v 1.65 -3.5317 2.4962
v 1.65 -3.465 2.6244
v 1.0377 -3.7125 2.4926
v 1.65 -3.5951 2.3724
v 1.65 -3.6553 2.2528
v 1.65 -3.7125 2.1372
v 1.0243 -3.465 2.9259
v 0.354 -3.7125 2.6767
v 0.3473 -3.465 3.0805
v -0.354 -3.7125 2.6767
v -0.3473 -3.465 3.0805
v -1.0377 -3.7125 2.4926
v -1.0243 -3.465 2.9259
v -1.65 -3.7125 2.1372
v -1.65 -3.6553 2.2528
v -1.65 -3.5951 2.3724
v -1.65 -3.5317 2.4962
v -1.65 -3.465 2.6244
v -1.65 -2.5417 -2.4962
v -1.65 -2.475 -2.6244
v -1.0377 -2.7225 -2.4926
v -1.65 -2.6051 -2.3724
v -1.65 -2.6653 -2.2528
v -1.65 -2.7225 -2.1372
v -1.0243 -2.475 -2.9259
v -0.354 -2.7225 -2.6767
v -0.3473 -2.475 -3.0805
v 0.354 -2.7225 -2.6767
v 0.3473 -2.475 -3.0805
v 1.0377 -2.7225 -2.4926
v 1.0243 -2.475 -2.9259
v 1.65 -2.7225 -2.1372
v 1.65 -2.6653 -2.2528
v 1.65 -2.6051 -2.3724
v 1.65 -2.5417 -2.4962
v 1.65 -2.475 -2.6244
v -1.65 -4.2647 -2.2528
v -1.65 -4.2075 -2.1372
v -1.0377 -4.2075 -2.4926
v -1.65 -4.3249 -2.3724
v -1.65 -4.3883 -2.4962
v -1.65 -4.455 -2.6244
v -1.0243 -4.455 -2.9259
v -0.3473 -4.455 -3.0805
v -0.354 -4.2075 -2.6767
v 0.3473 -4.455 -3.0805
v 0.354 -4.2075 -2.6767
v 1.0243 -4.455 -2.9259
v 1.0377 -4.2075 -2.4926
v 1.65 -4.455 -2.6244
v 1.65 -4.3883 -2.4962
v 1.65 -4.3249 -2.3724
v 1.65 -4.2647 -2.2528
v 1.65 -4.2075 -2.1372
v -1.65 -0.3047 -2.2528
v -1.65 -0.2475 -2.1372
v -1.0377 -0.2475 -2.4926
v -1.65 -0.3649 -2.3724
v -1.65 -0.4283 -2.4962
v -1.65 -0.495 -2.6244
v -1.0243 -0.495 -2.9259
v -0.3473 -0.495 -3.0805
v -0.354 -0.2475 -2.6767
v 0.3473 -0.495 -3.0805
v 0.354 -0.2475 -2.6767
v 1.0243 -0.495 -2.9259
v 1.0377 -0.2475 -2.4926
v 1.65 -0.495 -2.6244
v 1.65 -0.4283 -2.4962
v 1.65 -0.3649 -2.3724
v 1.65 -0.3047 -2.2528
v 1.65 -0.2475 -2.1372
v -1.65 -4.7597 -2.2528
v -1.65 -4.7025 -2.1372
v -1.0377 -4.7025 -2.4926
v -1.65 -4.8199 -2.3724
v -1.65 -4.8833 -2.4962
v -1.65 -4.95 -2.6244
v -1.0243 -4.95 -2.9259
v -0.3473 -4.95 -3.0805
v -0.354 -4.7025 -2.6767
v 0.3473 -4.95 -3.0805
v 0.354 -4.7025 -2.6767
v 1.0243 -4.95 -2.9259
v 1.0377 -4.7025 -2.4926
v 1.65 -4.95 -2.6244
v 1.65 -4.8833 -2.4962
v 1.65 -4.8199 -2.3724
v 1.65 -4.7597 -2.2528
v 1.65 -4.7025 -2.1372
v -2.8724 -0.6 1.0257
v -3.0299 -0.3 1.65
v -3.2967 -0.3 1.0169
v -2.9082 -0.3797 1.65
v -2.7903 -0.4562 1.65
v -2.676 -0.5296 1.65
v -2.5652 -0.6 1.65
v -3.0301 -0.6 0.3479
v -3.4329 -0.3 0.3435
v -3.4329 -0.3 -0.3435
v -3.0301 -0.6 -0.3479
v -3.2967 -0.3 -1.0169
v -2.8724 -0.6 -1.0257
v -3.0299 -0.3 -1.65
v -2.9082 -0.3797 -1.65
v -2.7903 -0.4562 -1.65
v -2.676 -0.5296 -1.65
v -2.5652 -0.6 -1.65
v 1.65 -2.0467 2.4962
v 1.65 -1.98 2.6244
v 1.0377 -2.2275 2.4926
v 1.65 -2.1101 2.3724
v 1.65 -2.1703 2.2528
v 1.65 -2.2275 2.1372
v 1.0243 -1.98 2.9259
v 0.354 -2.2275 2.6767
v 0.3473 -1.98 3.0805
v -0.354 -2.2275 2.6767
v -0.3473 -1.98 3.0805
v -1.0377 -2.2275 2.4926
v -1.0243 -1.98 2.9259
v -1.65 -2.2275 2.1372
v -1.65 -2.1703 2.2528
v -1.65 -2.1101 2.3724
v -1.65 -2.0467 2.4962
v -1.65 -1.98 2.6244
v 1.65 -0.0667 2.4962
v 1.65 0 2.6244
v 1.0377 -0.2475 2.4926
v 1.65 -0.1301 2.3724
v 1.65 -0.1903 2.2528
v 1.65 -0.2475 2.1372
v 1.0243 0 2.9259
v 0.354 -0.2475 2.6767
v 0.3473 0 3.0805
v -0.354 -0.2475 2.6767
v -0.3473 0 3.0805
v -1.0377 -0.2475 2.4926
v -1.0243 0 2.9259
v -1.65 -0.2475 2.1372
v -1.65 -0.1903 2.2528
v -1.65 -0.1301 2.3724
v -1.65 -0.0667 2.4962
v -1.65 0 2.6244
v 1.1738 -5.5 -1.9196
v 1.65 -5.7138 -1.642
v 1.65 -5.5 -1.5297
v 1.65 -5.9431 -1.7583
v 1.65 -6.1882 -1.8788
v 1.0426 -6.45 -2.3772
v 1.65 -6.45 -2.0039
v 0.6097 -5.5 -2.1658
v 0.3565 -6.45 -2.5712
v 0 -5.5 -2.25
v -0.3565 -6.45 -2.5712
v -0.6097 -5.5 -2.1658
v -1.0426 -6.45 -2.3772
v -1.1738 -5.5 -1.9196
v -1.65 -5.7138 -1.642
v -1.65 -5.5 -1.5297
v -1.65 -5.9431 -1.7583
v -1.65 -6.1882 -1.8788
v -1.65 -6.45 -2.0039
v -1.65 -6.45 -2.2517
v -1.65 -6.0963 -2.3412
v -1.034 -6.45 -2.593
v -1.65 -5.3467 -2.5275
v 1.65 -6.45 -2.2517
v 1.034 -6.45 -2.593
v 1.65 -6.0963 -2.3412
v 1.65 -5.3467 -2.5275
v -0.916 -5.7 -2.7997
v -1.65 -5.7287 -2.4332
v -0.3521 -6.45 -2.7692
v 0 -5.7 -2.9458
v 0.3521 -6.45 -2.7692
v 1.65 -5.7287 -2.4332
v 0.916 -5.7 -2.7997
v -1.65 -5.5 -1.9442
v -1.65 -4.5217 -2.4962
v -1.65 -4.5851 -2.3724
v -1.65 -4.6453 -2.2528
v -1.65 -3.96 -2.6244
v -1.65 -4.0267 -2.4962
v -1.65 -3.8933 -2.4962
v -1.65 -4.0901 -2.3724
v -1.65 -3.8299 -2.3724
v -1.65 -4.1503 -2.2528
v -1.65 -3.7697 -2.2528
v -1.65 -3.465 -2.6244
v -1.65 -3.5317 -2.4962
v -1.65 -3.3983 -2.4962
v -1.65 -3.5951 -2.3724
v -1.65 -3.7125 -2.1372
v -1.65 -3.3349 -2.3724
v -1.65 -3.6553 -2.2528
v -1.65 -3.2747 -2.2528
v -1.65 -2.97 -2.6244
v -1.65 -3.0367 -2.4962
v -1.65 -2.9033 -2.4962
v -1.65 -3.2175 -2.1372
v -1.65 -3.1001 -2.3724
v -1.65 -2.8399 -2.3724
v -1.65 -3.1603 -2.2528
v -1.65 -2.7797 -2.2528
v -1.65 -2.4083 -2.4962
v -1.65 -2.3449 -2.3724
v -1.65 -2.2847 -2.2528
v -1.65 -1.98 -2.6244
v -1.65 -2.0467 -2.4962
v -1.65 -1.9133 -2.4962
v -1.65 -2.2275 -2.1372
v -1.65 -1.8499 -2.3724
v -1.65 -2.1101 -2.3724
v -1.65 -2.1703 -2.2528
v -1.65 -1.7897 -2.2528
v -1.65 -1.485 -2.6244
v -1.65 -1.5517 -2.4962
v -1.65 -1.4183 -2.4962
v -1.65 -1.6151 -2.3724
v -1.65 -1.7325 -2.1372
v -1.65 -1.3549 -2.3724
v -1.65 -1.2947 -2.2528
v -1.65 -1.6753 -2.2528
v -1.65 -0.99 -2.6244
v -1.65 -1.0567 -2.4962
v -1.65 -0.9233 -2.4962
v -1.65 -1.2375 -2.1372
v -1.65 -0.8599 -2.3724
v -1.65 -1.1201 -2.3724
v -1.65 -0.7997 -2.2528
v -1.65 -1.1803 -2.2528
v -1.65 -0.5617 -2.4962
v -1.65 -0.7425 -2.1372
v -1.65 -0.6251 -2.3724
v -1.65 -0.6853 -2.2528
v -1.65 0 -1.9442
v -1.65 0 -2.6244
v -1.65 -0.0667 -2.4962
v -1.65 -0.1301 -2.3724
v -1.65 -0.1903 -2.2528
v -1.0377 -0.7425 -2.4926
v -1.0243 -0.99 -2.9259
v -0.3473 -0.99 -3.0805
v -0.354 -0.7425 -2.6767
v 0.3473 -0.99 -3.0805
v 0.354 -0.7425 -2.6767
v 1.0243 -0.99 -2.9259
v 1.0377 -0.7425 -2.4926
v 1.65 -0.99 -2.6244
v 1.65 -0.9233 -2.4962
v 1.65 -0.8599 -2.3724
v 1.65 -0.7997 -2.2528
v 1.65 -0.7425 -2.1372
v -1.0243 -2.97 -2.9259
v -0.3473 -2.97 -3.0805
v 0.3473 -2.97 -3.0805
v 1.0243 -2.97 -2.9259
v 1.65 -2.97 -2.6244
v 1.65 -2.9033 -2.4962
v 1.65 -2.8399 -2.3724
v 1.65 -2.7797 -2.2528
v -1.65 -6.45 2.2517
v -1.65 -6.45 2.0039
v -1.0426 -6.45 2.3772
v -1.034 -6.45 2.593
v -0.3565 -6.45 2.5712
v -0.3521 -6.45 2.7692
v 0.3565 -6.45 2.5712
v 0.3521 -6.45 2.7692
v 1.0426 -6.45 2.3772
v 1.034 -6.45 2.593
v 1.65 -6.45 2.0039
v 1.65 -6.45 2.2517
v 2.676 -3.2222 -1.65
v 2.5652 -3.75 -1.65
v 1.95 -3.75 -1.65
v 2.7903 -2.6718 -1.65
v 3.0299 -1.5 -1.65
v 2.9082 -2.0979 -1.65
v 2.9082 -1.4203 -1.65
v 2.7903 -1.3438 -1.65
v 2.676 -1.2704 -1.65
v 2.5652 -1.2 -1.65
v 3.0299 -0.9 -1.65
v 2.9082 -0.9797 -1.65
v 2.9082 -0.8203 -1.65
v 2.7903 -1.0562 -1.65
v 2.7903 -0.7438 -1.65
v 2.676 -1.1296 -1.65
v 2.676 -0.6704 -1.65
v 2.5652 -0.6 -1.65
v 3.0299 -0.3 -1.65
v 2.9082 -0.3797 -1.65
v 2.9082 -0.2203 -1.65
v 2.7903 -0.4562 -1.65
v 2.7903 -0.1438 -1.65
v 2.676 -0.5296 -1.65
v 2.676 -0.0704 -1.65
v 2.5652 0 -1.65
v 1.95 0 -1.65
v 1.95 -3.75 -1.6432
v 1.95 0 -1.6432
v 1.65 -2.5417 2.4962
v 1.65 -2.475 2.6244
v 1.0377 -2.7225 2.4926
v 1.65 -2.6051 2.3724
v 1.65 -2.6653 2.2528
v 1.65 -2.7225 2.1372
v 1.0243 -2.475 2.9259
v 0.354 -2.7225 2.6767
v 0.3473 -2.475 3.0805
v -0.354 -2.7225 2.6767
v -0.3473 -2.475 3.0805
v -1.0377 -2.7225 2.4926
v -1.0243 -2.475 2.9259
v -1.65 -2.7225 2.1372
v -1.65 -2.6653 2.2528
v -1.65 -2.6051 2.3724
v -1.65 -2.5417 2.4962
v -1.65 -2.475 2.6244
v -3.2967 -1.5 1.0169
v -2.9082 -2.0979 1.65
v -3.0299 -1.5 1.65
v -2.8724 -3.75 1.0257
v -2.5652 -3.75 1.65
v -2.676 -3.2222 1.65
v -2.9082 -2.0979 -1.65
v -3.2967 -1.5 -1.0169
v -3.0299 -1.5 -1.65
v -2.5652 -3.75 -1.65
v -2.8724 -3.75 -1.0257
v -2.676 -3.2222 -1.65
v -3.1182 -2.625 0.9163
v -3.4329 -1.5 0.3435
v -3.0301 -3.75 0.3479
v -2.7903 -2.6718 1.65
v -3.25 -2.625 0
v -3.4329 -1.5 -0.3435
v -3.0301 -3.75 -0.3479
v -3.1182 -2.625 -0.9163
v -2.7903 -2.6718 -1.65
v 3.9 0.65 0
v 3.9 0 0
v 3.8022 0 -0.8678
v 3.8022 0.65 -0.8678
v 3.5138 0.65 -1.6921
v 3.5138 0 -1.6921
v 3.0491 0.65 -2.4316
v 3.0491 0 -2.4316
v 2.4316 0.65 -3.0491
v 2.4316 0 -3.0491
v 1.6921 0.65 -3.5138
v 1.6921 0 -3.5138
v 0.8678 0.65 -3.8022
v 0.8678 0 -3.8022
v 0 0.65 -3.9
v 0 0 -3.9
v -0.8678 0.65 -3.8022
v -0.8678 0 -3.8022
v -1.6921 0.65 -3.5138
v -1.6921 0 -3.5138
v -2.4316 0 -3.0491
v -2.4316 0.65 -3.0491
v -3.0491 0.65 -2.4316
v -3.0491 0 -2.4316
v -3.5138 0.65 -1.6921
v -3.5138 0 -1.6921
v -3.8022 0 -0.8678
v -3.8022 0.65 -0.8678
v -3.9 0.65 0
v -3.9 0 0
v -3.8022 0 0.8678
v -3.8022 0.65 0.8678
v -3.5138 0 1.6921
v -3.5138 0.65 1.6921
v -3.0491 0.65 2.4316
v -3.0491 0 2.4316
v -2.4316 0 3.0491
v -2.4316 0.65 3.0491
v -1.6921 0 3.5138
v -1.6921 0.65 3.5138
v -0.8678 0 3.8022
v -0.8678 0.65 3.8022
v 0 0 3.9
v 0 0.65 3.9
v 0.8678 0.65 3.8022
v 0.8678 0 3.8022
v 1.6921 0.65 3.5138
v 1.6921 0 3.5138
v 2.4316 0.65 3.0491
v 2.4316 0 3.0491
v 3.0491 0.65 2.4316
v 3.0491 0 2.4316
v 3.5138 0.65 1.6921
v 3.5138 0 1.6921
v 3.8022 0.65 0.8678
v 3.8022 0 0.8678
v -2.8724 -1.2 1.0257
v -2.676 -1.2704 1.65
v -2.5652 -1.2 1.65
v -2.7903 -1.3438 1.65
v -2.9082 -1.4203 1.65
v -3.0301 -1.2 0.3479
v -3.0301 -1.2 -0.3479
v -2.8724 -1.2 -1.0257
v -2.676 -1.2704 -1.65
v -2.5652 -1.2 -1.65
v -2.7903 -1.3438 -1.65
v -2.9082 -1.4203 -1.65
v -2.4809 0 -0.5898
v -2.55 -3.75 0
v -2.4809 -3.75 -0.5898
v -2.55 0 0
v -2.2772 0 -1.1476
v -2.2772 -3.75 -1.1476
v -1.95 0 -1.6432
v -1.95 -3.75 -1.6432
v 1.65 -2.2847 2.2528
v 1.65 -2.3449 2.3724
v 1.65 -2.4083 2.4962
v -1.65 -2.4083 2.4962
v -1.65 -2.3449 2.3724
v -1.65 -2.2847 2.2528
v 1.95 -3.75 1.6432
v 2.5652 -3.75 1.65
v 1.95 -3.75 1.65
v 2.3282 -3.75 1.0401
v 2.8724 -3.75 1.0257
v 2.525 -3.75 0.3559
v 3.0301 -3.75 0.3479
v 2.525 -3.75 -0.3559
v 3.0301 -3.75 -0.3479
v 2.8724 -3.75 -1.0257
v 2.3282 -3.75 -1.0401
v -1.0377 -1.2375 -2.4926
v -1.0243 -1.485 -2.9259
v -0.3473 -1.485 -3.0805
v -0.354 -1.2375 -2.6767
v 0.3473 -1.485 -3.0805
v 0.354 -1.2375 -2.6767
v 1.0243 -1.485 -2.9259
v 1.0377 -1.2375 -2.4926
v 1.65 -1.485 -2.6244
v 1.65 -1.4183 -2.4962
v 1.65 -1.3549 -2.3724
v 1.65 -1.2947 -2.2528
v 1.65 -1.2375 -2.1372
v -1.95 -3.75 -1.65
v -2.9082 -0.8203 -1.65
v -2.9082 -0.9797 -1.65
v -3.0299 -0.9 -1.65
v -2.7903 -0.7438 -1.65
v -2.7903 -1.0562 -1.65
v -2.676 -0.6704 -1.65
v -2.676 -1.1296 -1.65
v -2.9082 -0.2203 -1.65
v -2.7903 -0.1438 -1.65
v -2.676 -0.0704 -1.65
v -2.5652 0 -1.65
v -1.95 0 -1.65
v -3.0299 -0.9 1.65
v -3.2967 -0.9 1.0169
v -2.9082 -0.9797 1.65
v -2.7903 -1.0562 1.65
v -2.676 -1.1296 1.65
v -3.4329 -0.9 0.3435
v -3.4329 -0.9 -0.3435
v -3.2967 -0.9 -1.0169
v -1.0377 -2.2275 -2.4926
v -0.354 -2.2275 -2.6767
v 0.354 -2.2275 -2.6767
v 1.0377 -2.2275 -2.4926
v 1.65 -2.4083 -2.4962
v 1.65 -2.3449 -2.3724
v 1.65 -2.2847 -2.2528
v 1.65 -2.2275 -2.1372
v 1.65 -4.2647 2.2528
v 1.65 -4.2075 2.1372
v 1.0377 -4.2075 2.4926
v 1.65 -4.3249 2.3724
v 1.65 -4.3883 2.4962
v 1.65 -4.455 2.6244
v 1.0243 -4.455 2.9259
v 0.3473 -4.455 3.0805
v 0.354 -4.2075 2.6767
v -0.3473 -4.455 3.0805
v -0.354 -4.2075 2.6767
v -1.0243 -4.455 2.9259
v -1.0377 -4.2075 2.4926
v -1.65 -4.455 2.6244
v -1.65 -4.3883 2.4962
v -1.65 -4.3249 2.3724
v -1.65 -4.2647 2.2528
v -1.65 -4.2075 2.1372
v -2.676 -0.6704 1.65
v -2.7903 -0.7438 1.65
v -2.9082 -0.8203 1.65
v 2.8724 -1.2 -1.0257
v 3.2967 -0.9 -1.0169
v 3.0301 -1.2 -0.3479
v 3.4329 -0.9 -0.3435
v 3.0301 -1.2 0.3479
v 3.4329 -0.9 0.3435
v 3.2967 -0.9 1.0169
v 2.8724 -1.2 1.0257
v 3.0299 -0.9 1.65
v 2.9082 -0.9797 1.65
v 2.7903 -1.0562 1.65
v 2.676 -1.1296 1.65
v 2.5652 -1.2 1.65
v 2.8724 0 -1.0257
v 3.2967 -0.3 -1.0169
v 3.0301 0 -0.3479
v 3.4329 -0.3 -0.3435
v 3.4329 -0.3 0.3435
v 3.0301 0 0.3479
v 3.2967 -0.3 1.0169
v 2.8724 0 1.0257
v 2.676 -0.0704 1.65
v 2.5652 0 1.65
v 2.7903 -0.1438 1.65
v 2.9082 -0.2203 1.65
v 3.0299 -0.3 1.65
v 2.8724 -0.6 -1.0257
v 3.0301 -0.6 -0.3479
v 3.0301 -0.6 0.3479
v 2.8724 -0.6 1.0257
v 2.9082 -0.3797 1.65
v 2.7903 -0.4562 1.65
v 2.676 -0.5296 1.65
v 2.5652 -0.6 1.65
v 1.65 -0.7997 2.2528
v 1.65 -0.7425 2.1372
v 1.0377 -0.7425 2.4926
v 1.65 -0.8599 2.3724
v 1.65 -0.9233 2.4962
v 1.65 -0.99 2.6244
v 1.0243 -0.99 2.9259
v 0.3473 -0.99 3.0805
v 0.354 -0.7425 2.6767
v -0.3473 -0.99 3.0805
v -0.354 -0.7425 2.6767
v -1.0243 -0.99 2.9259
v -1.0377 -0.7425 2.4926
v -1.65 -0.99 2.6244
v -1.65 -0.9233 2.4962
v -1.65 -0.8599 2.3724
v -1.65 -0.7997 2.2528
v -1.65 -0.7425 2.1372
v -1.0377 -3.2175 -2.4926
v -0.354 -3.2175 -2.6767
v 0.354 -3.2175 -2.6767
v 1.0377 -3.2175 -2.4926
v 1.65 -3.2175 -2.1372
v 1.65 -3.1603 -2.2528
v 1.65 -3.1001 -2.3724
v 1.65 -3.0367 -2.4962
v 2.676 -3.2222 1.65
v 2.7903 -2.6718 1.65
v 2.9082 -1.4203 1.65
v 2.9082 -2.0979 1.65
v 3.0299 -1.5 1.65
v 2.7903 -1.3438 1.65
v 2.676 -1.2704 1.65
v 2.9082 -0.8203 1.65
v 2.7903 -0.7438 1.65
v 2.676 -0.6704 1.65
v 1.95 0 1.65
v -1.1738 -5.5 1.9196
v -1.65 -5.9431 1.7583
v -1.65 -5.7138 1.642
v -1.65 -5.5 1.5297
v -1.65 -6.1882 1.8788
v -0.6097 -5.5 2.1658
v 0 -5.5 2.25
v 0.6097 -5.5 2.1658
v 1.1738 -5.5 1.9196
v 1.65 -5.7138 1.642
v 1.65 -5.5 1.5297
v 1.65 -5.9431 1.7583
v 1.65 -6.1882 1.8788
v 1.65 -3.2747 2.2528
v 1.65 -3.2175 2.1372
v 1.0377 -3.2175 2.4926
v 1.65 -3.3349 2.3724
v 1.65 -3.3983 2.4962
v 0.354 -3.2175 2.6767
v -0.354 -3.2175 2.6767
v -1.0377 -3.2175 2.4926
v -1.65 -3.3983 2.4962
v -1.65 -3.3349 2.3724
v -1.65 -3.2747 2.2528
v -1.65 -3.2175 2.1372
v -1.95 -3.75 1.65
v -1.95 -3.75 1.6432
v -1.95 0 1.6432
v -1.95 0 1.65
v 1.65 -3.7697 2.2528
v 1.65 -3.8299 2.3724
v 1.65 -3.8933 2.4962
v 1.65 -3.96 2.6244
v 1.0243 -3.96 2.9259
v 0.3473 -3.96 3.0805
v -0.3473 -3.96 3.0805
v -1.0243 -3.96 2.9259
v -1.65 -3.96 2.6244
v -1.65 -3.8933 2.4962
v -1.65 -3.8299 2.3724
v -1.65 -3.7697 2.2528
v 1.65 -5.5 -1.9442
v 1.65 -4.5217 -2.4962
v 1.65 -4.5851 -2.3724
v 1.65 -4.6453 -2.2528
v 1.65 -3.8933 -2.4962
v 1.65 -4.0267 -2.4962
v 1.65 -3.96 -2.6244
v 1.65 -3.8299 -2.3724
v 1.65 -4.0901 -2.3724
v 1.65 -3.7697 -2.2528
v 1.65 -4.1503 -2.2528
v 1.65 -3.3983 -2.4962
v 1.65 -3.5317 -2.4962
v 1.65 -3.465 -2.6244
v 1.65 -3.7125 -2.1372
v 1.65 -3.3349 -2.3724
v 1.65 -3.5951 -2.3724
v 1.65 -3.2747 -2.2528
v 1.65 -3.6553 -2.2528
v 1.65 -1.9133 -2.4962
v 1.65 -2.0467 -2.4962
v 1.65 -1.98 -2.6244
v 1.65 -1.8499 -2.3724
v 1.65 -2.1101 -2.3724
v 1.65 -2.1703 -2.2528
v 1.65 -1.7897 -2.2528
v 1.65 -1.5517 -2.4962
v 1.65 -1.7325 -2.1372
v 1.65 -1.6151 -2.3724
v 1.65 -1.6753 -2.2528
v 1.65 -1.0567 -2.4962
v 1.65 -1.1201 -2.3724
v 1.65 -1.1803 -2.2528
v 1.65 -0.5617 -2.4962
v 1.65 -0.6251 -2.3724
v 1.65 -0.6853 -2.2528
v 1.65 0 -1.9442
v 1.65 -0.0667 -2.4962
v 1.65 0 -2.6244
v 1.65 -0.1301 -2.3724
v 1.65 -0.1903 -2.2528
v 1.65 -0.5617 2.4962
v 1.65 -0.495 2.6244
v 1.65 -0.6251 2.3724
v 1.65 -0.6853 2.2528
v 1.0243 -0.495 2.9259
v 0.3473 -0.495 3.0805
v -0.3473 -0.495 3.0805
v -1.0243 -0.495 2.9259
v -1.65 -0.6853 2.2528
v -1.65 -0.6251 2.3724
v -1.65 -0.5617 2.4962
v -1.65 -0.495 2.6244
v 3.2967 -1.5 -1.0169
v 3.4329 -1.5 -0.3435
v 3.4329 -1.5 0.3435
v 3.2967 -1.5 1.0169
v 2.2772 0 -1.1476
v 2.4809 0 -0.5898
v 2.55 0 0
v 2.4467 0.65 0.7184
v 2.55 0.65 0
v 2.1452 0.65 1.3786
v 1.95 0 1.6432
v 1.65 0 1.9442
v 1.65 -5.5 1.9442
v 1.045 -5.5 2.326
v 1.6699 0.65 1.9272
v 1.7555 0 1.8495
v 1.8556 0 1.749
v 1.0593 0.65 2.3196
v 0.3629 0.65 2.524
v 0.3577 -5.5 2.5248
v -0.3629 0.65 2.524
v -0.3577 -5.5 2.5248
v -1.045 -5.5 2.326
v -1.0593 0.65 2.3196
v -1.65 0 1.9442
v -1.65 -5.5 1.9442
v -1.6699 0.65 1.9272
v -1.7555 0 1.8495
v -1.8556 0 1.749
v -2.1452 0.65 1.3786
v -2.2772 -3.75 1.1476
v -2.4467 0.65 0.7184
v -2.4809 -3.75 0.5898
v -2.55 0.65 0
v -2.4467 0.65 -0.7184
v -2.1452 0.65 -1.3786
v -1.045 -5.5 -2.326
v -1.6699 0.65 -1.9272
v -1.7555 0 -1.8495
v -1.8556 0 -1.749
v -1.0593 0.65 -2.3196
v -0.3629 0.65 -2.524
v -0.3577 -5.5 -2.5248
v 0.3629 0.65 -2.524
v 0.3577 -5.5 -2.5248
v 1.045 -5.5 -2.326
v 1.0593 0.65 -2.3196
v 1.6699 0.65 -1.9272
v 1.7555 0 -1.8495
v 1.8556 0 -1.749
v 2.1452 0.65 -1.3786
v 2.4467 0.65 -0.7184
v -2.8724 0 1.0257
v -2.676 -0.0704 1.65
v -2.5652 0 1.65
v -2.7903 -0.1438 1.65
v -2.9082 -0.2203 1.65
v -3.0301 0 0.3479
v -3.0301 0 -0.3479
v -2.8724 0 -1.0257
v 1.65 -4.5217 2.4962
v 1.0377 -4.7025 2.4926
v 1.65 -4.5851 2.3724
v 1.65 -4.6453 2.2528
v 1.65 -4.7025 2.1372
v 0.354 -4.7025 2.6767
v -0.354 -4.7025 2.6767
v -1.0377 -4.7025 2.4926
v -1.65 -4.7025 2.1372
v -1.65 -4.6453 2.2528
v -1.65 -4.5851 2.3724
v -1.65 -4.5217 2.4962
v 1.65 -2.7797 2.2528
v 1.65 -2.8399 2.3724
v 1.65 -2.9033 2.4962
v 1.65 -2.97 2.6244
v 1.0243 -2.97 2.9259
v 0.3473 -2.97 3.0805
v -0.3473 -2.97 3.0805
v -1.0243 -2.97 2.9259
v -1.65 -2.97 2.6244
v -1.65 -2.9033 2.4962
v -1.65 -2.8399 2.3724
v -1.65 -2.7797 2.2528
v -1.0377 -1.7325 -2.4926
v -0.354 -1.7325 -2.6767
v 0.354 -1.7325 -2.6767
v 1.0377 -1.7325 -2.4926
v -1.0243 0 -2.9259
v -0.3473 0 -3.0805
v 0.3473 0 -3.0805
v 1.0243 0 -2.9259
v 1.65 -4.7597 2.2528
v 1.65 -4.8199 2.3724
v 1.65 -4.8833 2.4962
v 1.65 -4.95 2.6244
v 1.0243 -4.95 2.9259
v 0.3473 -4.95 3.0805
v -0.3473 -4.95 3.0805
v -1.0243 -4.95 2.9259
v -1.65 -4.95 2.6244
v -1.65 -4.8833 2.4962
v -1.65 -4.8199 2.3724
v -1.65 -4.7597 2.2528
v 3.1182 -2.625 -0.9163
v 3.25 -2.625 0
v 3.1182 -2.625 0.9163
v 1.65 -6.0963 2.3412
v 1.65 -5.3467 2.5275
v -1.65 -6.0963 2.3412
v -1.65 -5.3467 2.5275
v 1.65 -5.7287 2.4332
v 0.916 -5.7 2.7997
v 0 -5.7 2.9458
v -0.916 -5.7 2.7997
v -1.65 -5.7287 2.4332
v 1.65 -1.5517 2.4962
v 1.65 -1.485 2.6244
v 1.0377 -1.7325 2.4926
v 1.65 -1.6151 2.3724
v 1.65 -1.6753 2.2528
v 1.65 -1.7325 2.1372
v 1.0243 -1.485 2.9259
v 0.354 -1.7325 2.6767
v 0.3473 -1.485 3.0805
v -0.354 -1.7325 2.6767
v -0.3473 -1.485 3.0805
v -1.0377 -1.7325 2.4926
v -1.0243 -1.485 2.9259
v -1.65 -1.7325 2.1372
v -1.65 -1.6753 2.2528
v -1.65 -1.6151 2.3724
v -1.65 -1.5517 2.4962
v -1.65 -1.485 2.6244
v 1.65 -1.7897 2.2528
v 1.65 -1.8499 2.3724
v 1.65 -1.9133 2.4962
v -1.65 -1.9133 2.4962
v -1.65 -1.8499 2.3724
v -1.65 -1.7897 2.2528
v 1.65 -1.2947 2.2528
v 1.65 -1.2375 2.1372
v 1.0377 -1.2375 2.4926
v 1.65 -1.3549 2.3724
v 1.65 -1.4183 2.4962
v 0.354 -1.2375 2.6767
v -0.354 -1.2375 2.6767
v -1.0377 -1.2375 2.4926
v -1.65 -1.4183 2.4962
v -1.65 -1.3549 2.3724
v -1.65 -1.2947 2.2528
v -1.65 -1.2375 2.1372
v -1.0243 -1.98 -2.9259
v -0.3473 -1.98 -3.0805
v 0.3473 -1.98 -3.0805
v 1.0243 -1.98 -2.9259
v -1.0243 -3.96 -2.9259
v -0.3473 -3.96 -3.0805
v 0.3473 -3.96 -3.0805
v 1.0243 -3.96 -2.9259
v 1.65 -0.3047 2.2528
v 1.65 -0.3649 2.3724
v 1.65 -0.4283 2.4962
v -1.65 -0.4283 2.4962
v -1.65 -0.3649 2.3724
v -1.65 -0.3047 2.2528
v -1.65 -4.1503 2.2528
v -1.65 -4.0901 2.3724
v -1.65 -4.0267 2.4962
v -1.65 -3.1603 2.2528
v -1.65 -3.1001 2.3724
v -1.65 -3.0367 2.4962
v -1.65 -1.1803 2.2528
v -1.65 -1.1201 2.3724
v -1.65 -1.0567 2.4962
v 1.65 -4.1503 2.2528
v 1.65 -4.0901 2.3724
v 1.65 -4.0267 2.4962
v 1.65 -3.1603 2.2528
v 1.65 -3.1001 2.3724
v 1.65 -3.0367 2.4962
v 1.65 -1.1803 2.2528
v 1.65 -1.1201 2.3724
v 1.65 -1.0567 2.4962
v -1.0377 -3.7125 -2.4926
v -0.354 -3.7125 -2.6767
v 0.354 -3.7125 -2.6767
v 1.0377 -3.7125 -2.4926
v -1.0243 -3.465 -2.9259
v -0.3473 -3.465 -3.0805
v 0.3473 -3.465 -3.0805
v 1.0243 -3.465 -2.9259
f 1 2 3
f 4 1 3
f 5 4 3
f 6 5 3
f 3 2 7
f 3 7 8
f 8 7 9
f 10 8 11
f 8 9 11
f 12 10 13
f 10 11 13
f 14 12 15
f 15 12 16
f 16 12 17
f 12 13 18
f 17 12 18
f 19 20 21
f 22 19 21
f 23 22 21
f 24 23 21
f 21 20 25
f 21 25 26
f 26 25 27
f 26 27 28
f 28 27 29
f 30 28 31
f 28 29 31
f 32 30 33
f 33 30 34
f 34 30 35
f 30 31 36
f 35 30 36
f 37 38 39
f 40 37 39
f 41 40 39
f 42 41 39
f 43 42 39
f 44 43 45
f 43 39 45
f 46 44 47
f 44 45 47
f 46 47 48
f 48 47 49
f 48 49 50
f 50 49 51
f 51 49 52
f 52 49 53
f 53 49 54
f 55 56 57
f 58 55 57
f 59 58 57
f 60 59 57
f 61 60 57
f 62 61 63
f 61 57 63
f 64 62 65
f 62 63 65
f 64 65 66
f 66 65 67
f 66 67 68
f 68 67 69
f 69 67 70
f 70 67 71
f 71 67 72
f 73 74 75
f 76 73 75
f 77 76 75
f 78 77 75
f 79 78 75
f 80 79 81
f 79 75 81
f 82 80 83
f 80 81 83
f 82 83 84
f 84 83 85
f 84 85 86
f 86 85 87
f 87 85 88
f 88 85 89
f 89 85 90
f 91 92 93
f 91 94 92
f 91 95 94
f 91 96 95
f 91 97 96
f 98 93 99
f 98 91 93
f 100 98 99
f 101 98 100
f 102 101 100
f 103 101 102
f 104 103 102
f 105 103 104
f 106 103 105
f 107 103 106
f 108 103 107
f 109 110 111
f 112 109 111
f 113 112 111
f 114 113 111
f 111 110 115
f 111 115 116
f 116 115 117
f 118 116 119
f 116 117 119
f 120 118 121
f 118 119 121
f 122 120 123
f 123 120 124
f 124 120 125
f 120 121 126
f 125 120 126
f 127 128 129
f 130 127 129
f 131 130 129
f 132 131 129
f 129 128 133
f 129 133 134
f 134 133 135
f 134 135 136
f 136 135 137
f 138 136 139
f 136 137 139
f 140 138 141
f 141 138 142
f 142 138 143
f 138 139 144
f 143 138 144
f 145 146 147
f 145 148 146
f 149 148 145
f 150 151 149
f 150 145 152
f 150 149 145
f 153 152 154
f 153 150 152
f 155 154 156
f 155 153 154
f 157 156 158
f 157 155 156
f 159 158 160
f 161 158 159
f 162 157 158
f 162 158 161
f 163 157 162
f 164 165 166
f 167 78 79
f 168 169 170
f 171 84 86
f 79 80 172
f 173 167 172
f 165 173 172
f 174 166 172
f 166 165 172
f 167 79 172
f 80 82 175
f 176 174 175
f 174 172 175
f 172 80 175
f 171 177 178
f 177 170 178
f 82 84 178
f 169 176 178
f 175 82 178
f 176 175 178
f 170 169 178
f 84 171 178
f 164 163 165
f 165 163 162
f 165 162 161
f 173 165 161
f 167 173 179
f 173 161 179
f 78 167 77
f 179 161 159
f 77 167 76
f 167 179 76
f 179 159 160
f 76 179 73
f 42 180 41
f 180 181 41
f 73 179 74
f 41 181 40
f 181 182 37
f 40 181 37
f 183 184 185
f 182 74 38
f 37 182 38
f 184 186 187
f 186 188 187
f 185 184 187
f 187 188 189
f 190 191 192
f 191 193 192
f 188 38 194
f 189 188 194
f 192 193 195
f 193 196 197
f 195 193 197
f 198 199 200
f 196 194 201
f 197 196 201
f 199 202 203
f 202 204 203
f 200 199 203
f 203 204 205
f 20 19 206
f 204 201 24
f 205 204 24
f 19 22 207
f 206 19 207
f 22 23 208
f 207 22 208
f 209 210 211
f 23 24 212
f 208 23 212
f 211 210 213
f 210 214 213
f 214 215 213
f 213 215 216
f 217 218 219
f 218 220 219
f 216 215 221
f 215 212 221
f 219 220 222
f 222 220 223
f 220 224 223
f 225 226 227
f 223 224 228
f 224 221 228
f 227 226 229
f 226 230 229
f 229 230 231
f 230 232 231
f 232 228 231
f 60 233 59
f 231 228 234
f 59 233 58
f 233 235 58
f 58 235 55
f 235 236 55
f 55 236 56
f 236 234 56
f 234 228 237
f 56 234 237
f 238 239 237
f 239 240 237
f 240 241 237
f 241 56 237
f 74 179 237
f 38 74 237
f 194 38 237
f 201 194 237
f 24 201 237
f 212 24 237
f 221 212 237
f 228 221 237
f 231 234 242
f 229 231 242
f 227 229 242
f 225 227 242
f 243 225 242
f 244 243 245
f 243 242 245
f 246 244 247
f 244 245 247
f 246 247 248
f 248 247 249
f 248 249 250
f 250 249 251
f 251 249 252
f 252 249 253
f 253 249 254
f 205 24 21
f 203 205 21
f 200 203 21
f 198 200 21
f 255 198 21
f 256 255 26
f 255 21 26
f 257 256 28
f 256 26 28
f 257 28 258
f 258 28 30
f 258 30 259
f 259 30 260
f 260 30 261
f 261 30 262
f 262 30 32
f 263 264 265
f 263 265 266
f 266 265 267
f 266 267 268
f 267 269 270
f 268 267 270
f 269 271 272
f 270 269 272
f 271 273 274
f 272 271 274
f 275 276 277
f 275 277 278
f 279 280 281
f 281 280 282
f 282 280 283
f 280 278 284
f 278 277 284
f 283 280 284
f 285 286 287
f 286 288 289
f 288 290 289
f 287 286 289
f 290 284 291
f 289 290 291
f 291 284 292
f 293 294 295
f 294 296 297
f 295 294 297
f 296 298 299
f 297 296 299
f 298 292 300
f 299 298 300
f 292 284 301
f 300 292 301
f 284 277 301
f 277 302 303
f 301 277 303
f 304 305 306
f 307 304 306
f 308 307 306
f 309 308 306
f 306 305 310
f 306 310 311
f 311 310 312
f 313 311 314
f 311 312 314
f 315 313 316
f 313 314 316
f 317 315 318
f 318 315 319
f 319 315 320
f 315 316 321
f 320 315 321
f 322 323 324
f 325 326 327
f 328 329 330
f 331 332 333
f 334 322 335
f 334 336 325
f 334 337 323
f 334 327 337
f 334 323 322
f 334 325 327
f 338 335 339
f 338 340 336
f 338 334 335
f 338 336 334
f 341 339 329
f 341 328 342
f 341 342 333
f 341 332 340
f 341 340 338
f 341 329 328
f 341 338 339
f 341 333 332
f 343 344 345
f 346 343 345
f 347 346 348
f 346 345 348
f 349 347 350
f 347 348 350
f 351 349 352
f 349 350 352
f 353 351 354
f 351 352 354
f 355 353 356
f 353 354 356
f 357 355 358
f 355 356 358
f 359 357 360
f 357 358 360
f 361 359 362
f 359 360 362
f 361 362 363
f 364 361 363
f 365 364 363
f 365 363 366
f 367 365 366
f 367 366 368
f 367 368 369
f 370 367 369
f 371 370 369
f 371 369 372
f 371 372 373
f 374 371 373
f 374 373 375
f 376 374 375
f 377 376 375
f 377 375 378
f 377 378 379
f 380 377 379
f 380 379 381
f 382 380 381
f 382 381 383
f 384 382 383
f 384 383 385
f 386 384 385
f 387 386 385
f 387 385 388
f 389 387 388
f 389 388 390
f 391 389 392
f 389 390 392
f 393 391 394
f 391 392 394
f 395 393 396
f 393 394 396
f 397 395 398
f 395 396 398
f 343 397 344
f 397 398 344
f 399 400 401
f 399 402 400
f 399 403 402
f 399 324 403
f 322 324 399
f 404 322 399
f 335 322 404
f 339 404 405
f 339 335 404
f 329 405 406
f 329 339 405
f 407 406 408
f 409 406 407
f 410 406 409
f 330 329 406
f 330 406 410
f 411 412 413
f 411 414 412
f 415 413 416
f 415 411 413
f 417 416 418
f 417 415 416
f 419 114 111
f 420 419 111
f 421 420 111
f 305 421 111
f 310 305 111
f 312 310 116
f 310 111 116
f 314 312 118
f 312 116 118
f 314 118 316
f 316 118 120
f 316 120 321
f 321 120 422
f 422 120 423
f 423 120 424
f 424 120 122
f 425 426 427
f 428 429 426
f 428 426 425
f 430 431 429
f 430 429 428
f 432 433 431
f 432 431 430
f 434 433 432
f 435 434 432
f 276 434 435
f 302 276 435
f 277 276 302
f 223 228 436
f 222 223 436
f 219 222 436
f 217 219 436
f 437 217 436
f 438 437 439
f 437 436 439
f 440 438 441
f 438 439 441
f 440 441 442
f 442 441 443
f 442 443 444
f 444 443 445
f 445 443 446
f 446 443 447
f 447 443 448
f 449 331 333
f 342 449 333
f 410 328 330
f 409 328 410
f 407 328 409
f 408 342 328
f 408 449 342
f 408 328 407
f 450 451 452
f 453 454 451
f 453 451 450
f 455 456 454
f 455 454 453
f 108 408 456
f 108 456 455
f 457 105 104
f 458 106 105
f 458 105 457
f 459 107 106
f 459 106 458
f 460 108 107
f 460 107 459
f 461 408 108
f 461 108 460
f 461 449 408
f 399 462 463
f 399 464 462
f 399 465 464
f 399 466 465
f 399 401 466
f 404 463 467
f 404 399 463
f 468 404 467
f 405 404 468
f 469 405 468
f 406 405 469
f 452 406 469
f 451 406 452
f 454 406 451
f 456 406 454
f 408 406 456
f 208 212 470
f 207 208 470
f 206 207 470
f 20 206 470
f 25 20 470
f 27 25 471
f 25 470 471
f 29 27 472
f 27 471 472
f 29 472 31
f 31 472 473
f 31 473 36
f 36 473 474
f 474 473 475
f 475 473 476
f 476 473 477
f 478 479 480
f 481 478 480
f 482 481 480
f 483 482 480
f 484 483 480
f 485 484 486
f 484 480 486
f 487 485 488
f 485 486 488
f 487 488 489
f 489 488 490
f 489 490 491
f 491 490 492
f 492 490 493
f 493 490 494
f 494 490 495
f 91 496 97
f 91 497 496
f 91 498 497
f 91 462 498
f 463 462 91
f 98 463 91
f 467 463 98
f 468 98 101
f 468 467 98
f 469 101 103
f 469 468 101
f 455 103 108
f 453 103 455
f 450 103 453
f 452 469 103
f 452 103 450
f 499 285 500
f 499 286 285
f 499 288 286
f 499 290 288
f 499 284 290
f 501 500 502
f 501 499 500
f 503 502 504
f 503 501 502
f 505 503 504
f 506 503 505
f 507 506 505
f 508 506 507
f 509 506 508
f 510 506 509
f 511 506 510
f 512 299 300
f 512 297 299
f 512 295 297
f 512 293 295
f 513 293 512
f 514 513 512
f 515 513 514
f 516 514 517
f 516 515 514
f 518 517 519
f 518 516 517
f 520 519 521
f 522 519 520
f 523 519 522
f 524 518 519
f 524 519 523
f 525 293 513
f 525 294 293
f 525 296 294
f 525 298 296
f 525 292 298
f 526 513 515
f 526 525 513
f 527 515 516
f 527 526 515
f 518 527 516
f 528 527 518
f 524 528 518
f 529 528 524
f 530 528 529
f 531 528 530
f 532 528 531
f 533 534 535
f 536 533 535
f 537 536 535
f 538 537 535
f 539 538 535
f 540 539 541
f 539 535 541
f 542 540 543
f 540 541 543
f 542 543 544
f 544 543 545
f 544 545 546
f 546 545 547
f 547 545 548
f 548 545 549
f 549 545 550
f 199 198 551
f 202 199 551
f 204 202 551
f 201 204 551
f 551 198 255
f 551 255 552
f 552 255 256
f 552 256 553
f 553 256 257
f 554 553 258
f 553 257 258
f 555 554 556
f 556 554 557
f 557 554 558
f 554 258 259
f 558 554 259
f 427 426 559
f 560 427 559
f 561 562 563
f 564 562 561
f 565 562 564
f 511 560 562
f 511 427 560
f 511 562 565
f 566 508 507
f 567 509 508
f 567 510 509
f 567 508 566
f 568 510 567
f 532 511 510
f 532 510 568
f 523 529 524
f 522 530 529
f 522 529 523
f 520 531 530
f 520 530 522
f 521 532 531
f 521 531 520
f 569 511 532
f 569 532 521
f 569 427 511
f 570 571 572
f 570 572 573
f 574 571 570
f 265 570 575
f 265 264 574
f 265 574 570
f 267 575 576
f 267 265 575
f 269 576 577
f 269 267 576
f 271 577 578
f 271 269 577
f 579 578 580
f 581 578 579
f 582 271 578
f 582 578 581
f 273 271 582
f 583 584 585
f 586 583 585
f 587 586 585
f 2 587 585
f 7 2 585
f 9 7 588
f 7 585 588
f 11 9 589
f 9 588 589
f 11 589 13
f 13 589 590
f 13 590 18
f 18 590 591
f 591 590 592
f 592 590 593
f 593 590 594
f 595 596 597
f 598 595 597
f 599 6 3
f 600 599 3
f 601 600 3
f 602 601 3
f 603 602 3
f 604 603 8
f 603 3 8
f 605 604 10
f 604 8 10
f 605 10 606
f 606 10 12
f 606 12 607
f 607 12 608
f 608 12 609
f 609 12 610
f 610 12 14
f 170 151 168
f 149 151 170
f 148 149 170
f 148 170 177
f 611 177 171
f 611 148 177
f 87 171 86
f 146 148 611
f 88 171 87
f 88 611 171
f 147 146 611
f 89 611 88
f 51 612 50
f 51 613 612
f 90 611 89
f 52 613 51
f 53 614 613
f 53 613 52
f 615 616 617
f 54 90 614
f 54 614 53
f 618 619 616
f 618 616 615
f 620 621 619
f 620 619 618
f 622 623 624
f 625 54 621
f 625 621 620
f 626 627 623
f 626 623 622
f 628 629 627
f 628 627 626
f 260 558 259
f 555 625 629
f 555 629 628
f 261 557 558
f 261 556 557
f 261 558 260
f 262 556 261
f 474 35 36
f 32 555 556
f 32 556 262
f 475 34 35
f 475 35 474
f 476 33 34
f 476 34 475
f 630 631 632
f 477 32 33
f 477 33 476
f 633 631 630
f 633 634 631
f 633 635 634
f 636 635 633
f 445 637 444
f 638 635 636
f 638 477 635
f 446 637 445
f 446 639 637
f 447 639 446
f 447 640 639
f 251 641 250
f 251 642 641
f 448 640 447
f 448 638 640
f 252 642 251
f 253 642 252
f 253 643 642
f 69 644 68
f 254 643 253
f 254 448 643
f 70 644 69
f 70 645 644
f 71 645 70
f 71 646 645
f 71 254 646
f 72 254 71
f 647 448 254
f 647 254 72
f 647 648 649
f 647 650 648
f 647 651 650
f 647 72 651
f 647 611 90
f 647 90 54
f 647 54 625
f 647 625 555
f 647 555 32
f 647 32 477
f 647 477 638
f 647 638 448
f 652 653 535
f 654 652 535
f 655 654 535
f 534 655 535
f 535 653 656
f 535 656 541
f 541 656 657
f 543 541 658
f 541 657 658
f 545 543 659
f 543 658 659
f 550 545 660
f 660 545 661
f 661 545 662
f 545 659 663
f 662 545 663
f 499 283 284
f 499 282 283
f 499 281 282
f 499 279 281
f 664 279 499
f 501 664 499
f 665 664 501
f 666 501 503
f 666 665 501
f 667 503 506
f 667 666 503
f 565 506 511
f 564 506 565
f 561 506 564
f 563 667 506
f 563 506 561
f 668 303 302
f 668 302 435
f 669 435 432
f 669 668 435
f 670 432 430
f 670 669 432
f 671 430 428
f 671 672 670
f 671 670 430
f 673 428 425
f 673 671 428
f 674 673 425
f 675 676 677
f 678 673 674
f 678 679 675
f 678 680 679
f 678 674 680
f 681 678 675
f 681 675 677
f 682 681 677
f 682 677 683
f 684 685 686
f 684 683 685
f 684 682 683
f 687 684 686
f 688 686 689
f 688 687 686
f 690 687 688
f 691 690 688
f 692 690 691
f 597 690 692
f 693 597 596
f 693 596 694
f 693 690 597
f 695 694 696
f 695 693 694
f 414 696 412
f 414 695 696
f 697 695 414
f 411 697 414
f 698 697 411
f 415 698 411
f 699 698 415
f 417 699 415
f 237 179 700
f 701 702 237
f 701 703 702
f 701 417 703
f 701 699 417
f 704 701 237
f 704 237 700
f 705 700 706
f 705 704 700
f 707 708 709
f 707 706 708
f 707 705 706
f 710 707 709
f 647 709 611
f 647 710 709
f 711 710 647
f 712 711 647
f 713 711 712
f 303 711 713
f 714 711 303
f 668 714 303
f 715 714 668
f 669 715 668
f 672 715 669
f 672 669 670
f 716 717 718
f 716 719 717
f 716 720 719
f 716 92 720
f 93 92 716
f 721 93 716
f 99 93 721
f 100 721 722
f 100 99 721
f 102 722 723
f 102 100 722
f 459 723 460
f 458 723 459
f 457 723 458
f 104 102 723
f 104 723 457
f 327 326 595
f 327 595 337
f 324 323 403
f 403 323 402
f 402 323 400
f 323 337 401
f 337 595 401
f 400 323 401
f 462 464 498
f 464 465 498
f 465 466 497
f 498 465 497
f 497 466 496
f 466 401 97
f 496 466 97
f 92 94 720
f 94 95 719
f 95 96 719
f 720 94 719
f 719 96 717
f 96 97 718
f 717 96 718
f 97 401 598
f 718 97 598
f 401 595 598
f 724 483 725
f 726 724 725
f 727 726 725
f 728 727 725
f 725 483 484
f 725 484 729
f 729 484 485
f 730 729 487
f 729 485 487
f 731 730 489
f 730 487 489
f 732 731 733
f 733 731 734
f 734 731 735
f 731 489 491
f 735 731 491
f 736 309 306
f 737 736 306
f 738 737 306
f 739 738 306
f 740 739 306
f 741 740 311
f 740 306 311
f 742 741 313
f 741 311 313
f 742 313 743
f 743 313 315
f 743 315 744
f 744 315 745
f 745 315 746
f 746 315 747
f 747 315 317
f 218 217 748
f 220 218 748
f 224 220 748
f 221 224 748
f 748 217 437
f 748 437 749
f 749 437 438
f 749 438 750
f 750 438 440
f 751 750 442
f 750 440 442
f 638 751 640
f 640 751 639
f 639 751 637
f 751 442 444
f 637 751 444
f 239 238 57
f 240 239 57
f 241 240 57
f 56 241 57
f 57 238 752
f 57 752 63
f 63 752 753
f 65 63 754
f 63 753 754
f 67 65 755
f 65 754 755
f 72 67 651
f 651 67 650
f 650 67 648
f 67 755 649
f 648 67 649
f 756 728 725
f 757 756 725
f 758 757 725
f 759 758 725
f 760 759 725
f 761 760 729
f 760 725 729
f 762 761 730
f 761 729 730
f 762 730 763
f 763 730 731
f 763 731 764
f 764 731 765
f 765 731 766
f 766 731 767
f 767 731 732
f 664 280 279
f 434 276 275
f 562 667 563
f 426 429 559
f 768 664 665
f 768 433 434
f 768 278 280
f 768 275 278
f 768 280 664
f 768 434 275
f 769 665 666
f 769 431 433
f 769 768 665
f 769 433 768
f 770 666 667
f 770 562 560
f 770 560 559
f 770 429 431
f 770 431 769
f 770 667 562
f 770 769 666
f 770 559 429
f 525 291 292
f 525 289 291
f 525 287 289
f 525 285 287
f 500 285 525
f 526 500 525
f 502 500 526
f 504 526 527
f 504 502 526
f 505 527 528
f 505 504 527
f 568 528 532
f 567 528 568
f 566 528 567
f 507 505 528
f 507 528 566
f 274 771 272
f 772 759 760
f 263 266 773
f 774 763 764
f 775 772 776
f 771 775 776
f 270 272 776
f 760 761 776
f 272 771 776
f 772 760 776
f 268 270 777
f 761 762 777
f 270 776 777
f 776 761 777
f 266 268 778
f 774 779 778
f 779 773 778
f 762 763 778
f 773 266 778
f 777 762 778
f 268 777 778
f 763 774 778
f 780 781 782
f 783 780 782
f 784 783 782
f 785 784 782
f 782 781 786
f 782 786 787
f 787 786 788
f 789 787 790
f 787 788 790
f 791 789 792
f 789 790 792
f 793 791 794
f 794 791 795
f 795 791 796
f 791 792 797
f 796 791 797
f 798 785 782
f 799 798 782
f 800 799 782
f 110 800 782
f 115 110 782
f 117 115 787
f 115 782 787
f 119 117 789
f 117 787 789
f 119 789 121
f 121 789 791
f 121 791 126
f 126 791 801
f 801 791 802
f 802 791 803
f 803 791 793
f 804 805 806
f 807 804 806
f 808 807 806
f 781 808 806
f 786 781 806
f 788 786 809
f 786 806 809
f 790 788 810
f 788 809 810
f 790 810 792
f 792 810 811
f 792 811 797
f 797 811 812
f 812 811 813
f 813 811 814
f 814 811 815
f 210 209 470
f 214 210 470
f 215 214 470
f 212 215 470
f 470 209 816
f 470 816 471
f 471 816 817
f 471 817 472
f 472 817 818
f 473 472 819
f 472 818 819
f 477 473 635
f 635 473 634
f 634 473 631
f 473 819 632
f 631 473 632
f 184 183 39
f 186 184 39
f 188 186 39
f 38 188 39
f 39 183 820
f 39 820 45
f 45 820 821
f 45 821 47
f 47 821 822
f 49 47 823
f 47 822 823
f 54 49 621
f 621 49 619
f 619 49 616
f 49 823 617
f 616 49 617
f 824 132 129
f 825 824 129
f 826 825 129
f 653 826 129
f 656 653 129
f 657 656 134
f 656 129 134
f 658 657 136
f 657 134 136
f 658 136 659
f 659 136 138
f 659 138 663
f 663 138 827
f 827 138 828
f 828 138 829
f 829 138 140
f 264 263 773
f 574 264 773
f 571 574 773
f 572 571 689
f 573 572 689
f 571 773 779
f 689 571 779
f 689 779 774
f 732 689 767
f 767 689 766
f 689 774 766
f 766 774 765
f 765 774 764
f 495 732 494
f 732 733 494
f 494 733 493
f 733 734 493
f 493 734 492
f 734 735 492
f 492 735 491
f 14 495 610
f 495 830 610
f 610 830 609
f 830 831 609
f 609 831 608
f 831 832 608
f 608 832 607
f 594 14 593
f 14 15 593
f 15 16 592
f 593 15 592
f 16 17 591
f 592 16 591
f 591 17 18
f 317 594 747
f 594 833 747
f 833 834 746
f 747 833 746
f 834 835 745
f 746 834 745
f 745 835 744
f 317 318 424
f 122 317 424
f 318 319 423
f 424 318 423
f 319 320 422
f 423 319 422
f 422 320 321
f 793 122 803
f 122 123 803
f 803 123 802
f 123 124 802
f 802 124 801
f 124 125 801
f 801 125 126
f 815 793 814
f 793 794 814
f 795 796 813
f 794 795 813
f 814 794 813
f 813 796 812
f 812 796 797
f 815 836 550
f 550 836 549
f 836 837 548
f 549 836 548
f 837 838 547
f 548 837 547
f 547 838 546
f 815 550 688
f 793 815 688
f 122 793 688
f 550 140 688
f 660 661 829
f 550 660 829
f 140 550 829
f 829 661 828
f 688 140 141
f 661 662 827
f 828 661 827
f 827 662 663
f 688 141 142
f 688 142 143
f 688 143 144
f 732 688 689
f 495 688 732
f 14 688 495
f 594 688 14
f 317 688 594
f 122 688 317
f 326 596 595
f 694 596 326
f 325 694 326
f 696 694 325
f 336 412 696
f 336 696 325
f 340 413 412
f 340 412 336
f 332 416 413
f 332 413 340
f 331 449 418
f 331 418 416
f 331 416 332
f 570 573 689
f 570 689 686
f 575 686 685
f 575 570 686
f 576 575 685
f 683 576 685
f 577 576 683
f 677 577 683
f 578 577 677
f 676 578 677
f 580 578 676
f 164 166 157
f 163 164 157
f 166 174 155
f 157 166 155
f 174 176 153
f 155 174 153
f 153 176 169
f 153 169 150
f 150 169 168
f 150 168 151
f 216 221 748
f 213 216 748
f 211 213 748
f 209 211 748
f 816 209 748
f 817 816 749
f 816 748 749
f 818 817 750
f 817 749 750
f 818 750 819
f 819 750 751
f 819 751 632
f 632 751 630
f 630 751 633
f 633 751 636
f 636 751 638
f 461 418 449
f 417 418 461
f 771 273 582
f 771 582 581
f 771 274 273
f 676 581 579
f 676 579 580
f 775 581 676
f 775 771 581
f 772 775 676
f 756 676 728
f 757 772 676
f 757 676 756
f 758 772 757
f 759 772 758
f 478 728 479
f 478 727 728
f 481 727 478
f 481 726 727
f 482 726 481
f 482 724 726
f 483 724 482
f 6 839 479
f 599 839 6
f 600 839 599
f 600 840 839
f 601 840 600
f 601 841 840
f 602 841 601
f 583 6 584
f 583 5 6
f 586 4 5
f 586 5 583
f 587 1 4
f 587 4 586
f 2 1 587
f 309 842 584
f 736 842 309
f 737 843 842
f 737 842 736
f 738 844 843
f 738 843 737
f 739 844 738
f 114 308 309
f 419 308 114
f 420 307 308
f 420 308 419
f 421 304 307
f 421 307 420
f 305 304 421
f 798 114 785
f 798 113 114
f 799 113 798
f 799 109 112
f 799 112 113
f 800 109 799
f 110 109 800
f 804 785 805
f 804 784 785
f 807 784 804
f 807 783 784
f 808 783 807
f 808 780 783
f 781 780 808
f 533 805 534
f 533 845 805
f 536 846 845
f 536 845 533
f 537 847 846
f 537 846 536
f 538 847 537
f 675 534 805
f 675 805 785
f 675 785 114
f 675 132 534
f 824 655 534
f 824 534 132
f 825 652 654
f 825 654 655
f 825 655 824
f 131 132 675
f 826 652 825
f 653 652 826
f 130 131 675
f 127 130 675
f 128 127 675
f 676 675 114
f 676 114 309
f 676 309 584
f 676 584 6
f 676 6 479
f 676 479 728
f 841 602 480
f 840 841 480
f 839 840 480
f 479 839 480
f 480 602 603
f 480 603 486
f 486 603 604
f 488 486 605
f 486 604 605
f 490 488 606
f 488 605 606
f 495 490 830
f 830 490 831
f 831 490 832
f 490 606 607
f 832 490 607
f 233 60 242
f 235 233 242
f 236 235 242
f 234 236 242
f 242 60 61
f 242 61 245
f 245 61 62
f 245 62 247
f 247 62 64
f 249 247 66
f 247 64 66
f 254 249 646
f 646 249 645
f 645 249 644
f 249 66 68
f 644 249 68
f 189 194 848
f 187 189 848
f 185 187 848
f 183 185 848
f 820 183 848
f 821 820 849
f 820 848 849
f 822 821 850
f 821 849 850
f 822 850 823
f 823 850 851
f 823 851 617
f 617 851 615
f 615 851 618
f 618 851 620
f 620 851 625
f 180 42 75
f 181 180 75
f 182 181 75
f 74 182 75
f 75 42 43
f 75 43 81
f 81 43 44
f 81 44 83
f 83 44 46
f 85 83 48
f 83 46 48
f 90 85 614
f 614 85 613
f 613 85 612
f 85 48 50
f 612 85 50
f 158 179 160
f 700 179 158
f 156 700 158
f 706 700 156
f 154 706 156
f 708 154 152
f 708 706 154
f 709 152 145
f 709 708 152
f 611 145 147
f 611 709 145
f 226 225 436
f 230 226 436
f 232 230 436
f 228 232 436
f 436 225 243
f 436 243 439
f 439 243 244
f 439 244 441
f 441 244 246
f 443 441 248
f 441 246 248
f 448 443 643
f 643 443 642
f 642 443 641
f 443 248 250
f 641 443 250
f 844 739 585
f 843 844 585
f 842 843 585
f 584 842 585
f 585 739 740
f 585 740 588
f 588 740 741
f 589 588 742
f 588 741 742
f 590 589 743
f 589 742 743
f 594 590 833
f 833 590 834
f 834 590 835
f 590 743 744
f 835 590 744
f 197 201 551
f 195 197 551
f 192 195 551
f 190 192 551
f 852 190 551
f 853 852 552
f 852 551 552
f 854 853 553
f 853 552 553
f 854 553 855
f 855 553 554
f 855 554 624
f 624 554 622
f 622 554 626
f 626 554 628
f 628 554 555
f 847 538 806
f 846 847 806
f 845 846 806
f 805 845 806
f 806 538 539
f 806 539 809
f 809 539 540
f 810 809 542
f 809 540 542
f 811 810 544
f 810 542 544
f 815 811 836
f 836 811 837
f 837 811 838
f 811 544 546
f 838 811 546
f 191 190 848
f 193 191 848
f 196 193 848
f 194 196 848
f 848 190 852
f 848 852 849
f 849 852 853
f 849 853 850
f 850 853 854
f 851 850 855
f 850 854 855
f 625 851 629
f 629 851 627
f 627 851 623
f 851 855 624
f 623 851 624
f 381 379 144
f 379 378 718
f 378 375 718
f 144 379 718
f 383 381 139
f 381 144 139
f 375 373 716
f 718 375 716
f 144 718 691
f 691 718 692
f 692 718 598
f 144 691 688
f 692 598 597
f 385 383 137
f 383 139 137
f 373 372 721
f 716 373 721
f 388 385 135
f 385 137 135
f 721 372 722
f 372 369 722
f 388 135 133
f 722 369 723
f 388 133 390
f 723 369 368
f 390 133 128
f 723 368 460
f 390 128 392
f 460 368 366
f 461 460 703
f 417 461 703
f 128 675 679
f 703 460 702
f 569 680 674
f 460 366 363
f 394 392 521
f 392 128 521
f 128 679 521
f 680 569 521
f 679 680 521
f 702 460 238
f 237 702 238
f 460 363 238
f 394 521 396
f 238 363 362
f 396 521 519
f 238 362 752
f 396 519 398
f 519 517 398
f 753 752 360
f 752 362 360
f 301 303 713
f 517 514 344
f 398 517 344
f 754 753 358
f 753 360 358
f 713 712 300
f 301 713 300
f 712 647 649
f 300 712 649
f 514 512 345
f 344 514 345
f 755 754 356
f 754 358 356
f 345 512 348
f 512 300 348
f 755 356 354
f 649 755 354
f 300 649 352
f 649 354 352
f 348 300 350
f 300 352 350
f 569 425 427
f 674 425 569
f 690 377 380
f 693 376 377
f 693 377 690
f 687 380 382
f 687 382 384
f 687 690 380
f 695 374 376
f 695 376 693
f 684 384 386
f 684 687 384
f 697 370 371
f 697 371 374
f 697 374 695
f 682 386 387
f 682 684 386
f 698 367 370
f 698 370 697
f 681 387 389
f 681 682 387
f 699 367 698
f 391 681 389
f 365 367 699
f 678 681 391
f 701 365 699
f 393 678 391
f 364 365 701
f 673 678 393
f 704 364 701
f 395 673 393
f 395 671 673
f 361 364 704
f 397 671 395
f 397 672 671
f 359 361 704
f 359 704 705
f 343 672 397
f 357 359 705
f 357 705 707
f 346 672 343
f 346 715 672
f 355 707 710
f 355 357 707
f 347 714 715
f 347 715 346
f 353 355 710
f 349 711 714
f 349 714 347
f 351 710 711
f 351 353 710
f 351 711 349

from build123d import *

# Parameters (mm, degrees)
SKETCH1_R               = 3.9
SKETCH1_R_2             = 2.55
BOSS_EXTRUDE1_DEPTH     = 0.65
SKETCH3_W               = 3.9
SKETCH3_H               = 6
CUT_EXTRUDE1_DEPTH      = 4.9
CUT_EXTRUDE1_DEPTH_BACK = 4.9
SKETCH4_W               = 3
SKETCH4_H               = 9
CUT_EXTRUDE2_DEPTH      = 4.9
CUT_EXTRUDE2_DEPTH_BACK = 4.9
SKETCH6_R               = 2.55
CUT_EXTRUDE3_DEPTH      = 5.5
SKETCH7_W               = 4
SKETCH7_H               = 8
CUT_EXTRUDE5_DEPTH      = 4.9
CUT_EXTRUDE5_DEPTH_BACK = 4.9
SKETCH9_R               = 2.25
CUT_EXTRUDE6_DEPTH      = 5.5
CUT_EXTRUDE6_TAPER      = -20


with BuildPart() as part:
    # Sketch1 → Boss-Extrude1 (new body)
    with BuildSketch(Plane(origin=(0, 0, 0), x_dir=(1, 0, 0), z_dir=(0, 1, 0))):
        Circle(SKETCH1_R)
        Circle(SKETCH1_R_2, mode=Mode.SUBTRACT)
    extrude(amount=BOSS_EXTRUDE1_DEPTH)

    # Sketch2 → Revolve1 (revolve)
    with BuildSketch(Plane.XY):
        Polygon((-2.55, 0), (-3.05, 0), (-3.45, -0.3), (-3.05, -0.6), (-3.45, -0.9), (-3.05, -1.2), (-3.45, -1.5), (-3.05, -3.75), (-2.55, -3.75), align=None)
    revolve(axis=Axis((0, 0, 0), (0, -1, 0)))

    # Sketch3 → Cut-Extrude1 (cut, two sides)
    with BuildSketch(Plane.XY) as cut_extrude1_sk:
        with Locations((0, -3)):
            Rectangle(SKETCH3_W, SKETCH3_H)
    extrude(amount=CUT_EXTRUDE1_DEPTH, mode=Mode.SUBTRACT)
    extrude(cut_extrude1_sk.sketch, amount=-CUT_EXTRUDE1_DEPTH_BACK, mode=Mode.SUBTRACT)

    # Sketch4 → Cut-Extrude2 (cut, two sides)
    with BuildSketch(Plane(origin=(0, 0, 0), x_dir=(0, 0, -1), z_dir=(1, 0, 0))) as cut_extrude2_sk:
        with Locations((-3.15, -4.5)):
            Rectangle(SKETCH4_W, SKETCH4_H)
        with Locations((3.15, -4.5)):
            Rectangle(SKETCH4_W, SKETCH4_H)
    extrude(amount=CUT_EXTRUDE2_DEPTH, mode=Mode.SUBTRACT)
    extrude(cut_extrude2_sk.sketch, amount=-CUT_EXTRUDE2_DEPTH_BACK, mode=Mode.SUBTRACT)


with BuildPart() as body_2:
    # Sketch5 → Revolve2 (revolve)
    with BuildSketch(Plane(origin=(0, 0, 0), x_dir=(0, 0, -1), z_dir=(1, 0, 0))):
        Polygon((3.1, -4.95), (2.7, -4.7025), (3.1, -4.455), (2.7, -4.2075), (3.1, -3.96), (2.7, -3.7125), (3.1, -3.465), (2.7, -3.2175), (3.1, -2.97), (2.7, -2.7225), (3.1, -2.475), (2.7, -2.2275), (3.1, -1.98), (2.7, -1.7325), (3.1, -1.485), (2.7, -1.2375), (3.1, -0.99), (2.7, -0.7425), (3.1, -0.495), (2.7, -0.2475), (3.1, 0), (0, 0), (0, -6.45), (2.791521213, -6.45), align=None)
    revolve(axis=Axis((0, 0, 0), (0, -1, 0)))

    # Sketch6 → Cut-Extrude3 (cut)
    with BuildSketch(Plane(origin=(0, 0, 0), x_dir=(1, 0, 0), z_dir=(0, 1, 0))):
        Circle(SKETCH6_R)
    extrude(amount=-CUT_EXTRUDE3_DEPTH, mode=Mode.SUBTRACT)

    # Sketch7 → Cut-Extrude5 (cut, two sides)
    with BuildSketch(Plane.XY) as cut_extrude5_sk:
        with Locations((3.65, -4)):
            Rectangle(SKETCH7_W, SKETCH7_H)
        with Locations((-3.65, -4)):
            Rectangle(SKETCH7_W, SKETCH7_H)
    extrude(amount=CUT_EXTRUDE5_DEPTH, mode=Mode.SUBTRACT)
    extrude(cut_extrude5_sk.sketch, amount=-CUT_EXTRUDE5_DEPTH_BACK, mode=Mode.SUBTRACT)

    # Sketch9 → Cut-Extrude6 (cut)
    with BuildSketch(Plane(origin=(0, -5.5, 0), x_dir=(1, 0, 0), z_dir=(0, 1, 0))):
        Circle(SKETCH9_R)
    extrude(amount=-CUT_EXTRUDE6_DEPTH, taper=CUT_EXTRUDE6_TAPER, mode=Mode.SUBTRACT)


with BuildPart() as part_1:
    add(part.part)

    # Combine1: union body 2
    add(body_2.part)


solid = part_1.part
